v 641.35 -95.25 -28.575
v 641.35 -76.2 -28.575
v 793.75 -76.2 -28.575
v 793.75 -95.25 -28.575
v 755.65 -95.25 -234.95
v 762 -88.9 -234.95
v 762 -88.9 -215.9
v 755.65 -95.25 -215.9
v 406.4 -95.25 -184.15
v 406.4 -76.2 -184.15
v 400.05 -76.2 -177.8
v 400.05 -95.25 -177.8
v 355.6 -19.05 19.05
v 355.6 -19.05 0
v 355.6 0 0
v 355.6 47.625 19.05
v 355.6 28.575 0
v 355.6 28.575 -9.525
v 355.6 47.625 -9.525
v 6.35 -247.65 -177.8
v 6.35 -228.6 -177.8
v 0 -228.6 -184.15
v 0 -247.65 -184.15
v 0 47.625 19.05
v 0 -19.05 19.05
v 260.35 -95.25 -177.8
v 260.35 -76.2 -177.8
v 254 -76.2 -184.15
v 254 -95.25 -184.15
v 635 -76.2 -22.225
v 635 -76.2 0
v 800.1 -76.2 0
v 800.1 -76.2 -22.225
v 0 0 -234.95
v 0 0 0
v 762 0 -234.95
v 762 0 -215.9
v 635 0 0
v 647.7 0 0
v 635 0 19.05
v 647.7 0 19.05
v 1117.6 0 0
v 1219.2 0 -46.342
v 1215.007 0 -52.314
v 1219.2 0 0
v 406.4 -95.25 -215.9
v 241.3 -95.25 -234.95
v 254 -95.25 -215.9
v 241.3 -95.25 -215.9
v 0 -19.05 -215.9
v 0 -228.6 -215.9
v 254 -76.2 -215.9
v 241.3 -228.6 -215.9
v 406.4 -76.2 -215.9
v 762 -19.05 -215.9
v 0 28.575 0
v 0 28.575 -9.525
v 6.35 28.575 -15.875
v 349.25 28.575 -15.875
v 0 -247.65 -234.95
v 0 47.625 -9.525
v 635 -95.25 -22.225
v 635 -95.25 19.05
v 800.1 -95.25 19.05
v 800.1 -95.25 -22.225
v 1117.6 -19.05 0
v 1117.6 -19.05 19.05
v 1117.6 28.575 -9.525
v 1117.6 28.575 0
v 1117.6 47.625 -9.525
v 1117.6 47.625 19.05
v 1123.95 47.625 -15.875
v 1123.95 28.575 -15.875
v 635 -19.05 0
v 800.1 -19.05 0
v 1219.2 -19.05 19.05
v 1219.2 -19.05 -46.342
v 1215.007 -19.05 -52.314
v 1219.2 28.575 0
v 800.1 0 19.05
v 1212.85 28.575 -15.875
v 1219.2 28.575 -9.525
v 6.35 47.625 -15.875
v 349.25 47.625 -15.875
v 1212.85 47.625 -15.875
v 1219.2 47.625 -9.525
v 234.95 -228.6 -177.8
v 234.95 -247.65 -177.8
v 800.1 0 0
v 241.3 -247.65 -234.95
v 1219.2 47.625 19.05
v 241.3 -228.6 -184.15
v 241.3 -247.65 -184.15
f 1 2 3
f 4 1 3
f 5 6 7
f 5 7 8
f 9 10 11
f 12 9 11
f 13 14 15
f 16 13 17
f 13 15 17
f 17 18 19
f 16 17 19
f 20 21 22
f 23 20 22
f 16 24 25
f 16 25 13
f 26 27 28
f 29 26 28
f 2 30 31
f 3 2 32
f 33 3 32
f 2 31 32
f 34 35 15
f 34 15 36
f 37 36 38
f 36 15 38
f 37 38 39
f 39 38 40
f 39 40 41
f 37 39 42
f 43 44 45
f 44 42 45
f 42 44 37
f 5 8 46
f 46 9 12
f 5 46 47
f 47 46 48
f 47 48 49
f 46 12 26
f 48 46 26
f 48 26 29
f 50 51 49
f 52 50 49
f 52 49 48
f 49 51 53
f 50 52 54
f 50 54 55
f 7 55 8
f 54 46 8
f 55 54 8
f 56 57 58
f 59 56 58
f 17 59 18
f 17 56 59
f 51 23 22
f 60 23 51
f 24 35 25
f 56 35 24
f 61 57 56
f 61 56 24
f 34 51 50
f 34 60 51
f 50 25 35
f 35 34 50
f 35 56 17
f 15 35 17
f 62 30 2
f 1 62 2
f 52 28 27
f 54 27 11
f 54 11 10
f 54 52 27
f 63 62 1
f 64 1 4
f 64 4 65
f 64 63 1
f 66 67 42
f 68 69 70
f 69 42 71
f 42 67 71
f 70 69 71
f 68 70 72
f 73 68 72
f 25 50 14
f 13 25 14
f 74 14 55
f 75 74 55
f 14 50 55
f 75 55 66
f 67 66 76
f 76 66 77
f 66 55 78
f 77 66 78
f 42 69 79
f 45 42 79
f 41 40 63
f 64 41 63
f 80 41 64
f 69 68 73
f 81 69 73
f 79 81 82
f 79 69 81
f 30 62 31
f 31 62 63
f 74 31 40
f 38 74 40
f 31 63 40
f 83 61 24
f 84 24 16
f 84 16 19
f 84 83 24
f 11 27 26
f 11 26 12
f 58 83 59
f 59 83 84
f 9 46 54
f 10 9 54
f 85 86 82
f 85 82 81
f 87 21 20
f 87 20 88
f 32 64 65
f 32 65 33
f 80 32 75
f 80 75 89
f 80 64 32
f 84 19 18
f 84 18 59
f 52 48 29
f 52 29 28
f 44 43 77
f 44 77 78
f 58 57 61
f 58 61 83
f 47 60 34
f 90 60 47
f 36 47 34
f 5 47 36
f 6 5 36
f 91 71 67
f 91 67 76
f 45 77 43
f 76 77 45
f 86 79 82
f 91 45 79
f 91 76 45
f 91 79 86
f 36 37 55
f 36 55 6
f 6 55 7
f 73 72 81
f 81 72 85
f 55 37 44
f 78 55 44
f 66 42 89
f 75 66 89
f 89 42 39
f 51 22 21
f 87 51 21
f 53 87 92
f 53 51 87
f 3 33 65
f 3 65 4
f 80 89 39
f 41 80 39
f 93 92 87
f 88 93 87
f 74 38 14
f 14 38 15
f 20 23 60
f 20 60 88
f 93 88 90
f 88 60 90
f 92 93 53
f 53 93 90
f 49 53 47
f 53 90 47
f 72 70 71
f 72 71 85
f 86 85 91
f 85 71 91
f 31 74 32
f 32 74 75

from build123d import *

# Parameters (mm, degrees)
F1_DEPTH      = 19.05
F2_W          = 355.6
F2_H          = 66.675
F2_W_2        = 101.6
F2_W_3        = 165.1
F2_H_2        = 76.2000030398
F3_DEPTH      = 19.05
F4_W          = 101.6
F4_H          = 19.05
F4_W_2        = 355.6
F4_W_3        = 165.1
F5_DEPTH      = 15.875
F6_W          = 241.3
F6_H          = 152.4
F7_DEPTH      = 19.05
F8_W          = 241.3
F8_H          = 19.05
F8_W_2        = 152.4
F9_DEPTH      = 38.1
F10_DEPTH     = 12.7
F11_T1_DEPTH  = 51.7103739472
F11_T3_DEPTH  = 51.7103739472
F11_T5_DEPTH  = 51.7103739472
F11_T7_DEPTH  = 51.7103739472
F11_T9_DEPTH  = 51.7103739472
F11_T11_DEPTH = 42.3922386312


# Not quite as in the source:
# - a fillet or chamfer that OpenCascade refuses, or shapes differently, is made with other operations: its cross-section is extruded or revolved along the edge and cut away or added
# - ends of sketch curves that miss each other by under 0.0002 mm in the source are joined


with BuildPart() as f1:
    # F0 (on Front) → F1 (new body)
    with BuildSketch(Plane.XZ):
        Polygon((1219.2, 0), (0, 0), (0, -215.9), (762, -215.9), (1219.2, -50.8), align=None)
    extrude(amount=F1_DEPTH)

    # F2 (on face) → F3 (join)
    with BuildSketch(Plane.XY):
        with Locations((177.8, 14.2875)):
            Rectangle(F2_W, F2_H)
        with Locations((1168.4, 14.2875)):
            Rectangle(F2_W_2, F2_H)
        with Locations((717.55, -57.1500015199)):
            Rectangle(F2_W_3, F2_H_2)
        Polygon((635, 0), (635, -19.05), (800.1, -19.05), (800.1, -3.0398e-06), (647.7, 0), align=None)
    extrude(amount=F3_DEPTH)

    # F4 (on face) → F5 (join)
    with BuildSketch(Plane.XY):
        with Locations((1168.4, 38.1)):
            Rectangle(F4_W, F4_H)
        with Locations((177.8, 38.1)):
            Rectangle(F4_W_2, F4_H)
        with Locations((717.55, -85.7250030398)):
            Rectangle(F4_W_3, F4_H)
    extrude(amount=-F5_DEPTH)

    # F6 (on face) → F7 (join)
    with BuildSketch(Plane(origin=(0, 0, -215.9), x_dir=(1, 0, 0), z_dir=(0, 0, -1))):
        Polygon((0, 95.25), (0, 0), (762, 0), (762, 95.25), (241.3, 95.25), align=None)
        with Locations((120.65, 171.45)):
            Rectangle(F6_W, F6_H)
    extrude(amount=F7_DEPTH)

    # F8 (on face) → F9 (join)
    with BuildSketch(Plane.XY.offset(-215.9)):
        with Locations((120.65, -238.125)):
            Rectangle(F8_W, F8_H)
        with Locations((330.2, -85.725)):
            Rectangle(F8_W_2, F8_H)
    extrude(amount=F9_DEPTH)

    # F10 (add): a face of the model
    f10_faces = [f1.faces().sort_by_distance(p)[0] for p in [
        (717.55, -85.7250030398, -15.875),
    ]]
    extrude(f10_faces, amount=F10_DEPTH)

    # F11: chamfer of 6.35 on 12 edges, made by hand

    # F11_s2 → F11_t1 (cut)
    with BuildSketch(Plane.XZ.offset(212.2698130264)):
        Polygon((6.35, -177.8), (0, -184.15), (0, -177.8), align=None)
        Polygon((241.3, -184.15), (234.95, -177.8), (241.3, -177.8), align=None)
    extrude(amount=F11_T1_DEPTH, mode=Mode.SUBTRACT)

    # F11_s4 → F11_t3 (cut)
    with BuildSketch(Plane.XZ.offset(59.8698130264)):
        Polygon((260.35, -177.8), (254, -184.15), (254, -177.8), align=None)
        Polygon((406.4, -184.15), (400.05, -177.8), (406.4, -177.8), align=None)
    extrude(amount=F11_T3_DEPTH, mode=Mode.SUBTRACT)

    # F11_s6 → F11_t5 (cut)
    with BuildSketch(Plane.XZ.offset(59.8698160663)):
        Polygon((800.1, -22.225), (793.75, -28.575), (800.1, -28.575), align=None)
        Polygon((635, -22.225), (641.35, -28.575), (635, -28.575), align=None)
    extrude(amount=F11_T5_DEPTH, mode=Mode.SUBTRACT)

    # F11_s8 → F11_t7 (cut)
    with BuildSketch(Plane.XY.offset(-251.2801869736)):
        Polygon((762, -88.9), (755.65, -95.25), (762, -95.25), align=None)
    extrude(amount=F11_T7_DEPTH, mode=Mode.SUBTRACT)

    # F11_s10 → F11_t9 (cut)
    with BuildSketch(Plane.XZ.offset(-63.9551869736)):
        Polygon((1219.2, -9.525), (1212.85, -15.875), (1219.2, -15.875), align=None)
        Polygon((355.6, -9.525), (349.25, -15.875), (355.6, -15.875), align=None)
        Polygon((1117.6, -9.525), (1123.95, -15.875), (1117.6, -15.875), align=None)
        Polygon((0, -9.525), (6.35, -15.875), (0, -15.875), align=None)
    extrude(amount=F11_T9_DEPTH, mode=Mode.SUBTRACT)

    # F11_s12 → F11_t11 (cut)
    with BuildSketch(Plane.XZ.offset(-11.6711193156)):
        Polygon((1219.2, -46.3417146679), (1215.006742345, -52.314231931), (1219.2, -50.8), align=None)
    extrude(amount=F11_T11_DEPTH, mode=Mode.SUBTRACT)


solid = f1.part
